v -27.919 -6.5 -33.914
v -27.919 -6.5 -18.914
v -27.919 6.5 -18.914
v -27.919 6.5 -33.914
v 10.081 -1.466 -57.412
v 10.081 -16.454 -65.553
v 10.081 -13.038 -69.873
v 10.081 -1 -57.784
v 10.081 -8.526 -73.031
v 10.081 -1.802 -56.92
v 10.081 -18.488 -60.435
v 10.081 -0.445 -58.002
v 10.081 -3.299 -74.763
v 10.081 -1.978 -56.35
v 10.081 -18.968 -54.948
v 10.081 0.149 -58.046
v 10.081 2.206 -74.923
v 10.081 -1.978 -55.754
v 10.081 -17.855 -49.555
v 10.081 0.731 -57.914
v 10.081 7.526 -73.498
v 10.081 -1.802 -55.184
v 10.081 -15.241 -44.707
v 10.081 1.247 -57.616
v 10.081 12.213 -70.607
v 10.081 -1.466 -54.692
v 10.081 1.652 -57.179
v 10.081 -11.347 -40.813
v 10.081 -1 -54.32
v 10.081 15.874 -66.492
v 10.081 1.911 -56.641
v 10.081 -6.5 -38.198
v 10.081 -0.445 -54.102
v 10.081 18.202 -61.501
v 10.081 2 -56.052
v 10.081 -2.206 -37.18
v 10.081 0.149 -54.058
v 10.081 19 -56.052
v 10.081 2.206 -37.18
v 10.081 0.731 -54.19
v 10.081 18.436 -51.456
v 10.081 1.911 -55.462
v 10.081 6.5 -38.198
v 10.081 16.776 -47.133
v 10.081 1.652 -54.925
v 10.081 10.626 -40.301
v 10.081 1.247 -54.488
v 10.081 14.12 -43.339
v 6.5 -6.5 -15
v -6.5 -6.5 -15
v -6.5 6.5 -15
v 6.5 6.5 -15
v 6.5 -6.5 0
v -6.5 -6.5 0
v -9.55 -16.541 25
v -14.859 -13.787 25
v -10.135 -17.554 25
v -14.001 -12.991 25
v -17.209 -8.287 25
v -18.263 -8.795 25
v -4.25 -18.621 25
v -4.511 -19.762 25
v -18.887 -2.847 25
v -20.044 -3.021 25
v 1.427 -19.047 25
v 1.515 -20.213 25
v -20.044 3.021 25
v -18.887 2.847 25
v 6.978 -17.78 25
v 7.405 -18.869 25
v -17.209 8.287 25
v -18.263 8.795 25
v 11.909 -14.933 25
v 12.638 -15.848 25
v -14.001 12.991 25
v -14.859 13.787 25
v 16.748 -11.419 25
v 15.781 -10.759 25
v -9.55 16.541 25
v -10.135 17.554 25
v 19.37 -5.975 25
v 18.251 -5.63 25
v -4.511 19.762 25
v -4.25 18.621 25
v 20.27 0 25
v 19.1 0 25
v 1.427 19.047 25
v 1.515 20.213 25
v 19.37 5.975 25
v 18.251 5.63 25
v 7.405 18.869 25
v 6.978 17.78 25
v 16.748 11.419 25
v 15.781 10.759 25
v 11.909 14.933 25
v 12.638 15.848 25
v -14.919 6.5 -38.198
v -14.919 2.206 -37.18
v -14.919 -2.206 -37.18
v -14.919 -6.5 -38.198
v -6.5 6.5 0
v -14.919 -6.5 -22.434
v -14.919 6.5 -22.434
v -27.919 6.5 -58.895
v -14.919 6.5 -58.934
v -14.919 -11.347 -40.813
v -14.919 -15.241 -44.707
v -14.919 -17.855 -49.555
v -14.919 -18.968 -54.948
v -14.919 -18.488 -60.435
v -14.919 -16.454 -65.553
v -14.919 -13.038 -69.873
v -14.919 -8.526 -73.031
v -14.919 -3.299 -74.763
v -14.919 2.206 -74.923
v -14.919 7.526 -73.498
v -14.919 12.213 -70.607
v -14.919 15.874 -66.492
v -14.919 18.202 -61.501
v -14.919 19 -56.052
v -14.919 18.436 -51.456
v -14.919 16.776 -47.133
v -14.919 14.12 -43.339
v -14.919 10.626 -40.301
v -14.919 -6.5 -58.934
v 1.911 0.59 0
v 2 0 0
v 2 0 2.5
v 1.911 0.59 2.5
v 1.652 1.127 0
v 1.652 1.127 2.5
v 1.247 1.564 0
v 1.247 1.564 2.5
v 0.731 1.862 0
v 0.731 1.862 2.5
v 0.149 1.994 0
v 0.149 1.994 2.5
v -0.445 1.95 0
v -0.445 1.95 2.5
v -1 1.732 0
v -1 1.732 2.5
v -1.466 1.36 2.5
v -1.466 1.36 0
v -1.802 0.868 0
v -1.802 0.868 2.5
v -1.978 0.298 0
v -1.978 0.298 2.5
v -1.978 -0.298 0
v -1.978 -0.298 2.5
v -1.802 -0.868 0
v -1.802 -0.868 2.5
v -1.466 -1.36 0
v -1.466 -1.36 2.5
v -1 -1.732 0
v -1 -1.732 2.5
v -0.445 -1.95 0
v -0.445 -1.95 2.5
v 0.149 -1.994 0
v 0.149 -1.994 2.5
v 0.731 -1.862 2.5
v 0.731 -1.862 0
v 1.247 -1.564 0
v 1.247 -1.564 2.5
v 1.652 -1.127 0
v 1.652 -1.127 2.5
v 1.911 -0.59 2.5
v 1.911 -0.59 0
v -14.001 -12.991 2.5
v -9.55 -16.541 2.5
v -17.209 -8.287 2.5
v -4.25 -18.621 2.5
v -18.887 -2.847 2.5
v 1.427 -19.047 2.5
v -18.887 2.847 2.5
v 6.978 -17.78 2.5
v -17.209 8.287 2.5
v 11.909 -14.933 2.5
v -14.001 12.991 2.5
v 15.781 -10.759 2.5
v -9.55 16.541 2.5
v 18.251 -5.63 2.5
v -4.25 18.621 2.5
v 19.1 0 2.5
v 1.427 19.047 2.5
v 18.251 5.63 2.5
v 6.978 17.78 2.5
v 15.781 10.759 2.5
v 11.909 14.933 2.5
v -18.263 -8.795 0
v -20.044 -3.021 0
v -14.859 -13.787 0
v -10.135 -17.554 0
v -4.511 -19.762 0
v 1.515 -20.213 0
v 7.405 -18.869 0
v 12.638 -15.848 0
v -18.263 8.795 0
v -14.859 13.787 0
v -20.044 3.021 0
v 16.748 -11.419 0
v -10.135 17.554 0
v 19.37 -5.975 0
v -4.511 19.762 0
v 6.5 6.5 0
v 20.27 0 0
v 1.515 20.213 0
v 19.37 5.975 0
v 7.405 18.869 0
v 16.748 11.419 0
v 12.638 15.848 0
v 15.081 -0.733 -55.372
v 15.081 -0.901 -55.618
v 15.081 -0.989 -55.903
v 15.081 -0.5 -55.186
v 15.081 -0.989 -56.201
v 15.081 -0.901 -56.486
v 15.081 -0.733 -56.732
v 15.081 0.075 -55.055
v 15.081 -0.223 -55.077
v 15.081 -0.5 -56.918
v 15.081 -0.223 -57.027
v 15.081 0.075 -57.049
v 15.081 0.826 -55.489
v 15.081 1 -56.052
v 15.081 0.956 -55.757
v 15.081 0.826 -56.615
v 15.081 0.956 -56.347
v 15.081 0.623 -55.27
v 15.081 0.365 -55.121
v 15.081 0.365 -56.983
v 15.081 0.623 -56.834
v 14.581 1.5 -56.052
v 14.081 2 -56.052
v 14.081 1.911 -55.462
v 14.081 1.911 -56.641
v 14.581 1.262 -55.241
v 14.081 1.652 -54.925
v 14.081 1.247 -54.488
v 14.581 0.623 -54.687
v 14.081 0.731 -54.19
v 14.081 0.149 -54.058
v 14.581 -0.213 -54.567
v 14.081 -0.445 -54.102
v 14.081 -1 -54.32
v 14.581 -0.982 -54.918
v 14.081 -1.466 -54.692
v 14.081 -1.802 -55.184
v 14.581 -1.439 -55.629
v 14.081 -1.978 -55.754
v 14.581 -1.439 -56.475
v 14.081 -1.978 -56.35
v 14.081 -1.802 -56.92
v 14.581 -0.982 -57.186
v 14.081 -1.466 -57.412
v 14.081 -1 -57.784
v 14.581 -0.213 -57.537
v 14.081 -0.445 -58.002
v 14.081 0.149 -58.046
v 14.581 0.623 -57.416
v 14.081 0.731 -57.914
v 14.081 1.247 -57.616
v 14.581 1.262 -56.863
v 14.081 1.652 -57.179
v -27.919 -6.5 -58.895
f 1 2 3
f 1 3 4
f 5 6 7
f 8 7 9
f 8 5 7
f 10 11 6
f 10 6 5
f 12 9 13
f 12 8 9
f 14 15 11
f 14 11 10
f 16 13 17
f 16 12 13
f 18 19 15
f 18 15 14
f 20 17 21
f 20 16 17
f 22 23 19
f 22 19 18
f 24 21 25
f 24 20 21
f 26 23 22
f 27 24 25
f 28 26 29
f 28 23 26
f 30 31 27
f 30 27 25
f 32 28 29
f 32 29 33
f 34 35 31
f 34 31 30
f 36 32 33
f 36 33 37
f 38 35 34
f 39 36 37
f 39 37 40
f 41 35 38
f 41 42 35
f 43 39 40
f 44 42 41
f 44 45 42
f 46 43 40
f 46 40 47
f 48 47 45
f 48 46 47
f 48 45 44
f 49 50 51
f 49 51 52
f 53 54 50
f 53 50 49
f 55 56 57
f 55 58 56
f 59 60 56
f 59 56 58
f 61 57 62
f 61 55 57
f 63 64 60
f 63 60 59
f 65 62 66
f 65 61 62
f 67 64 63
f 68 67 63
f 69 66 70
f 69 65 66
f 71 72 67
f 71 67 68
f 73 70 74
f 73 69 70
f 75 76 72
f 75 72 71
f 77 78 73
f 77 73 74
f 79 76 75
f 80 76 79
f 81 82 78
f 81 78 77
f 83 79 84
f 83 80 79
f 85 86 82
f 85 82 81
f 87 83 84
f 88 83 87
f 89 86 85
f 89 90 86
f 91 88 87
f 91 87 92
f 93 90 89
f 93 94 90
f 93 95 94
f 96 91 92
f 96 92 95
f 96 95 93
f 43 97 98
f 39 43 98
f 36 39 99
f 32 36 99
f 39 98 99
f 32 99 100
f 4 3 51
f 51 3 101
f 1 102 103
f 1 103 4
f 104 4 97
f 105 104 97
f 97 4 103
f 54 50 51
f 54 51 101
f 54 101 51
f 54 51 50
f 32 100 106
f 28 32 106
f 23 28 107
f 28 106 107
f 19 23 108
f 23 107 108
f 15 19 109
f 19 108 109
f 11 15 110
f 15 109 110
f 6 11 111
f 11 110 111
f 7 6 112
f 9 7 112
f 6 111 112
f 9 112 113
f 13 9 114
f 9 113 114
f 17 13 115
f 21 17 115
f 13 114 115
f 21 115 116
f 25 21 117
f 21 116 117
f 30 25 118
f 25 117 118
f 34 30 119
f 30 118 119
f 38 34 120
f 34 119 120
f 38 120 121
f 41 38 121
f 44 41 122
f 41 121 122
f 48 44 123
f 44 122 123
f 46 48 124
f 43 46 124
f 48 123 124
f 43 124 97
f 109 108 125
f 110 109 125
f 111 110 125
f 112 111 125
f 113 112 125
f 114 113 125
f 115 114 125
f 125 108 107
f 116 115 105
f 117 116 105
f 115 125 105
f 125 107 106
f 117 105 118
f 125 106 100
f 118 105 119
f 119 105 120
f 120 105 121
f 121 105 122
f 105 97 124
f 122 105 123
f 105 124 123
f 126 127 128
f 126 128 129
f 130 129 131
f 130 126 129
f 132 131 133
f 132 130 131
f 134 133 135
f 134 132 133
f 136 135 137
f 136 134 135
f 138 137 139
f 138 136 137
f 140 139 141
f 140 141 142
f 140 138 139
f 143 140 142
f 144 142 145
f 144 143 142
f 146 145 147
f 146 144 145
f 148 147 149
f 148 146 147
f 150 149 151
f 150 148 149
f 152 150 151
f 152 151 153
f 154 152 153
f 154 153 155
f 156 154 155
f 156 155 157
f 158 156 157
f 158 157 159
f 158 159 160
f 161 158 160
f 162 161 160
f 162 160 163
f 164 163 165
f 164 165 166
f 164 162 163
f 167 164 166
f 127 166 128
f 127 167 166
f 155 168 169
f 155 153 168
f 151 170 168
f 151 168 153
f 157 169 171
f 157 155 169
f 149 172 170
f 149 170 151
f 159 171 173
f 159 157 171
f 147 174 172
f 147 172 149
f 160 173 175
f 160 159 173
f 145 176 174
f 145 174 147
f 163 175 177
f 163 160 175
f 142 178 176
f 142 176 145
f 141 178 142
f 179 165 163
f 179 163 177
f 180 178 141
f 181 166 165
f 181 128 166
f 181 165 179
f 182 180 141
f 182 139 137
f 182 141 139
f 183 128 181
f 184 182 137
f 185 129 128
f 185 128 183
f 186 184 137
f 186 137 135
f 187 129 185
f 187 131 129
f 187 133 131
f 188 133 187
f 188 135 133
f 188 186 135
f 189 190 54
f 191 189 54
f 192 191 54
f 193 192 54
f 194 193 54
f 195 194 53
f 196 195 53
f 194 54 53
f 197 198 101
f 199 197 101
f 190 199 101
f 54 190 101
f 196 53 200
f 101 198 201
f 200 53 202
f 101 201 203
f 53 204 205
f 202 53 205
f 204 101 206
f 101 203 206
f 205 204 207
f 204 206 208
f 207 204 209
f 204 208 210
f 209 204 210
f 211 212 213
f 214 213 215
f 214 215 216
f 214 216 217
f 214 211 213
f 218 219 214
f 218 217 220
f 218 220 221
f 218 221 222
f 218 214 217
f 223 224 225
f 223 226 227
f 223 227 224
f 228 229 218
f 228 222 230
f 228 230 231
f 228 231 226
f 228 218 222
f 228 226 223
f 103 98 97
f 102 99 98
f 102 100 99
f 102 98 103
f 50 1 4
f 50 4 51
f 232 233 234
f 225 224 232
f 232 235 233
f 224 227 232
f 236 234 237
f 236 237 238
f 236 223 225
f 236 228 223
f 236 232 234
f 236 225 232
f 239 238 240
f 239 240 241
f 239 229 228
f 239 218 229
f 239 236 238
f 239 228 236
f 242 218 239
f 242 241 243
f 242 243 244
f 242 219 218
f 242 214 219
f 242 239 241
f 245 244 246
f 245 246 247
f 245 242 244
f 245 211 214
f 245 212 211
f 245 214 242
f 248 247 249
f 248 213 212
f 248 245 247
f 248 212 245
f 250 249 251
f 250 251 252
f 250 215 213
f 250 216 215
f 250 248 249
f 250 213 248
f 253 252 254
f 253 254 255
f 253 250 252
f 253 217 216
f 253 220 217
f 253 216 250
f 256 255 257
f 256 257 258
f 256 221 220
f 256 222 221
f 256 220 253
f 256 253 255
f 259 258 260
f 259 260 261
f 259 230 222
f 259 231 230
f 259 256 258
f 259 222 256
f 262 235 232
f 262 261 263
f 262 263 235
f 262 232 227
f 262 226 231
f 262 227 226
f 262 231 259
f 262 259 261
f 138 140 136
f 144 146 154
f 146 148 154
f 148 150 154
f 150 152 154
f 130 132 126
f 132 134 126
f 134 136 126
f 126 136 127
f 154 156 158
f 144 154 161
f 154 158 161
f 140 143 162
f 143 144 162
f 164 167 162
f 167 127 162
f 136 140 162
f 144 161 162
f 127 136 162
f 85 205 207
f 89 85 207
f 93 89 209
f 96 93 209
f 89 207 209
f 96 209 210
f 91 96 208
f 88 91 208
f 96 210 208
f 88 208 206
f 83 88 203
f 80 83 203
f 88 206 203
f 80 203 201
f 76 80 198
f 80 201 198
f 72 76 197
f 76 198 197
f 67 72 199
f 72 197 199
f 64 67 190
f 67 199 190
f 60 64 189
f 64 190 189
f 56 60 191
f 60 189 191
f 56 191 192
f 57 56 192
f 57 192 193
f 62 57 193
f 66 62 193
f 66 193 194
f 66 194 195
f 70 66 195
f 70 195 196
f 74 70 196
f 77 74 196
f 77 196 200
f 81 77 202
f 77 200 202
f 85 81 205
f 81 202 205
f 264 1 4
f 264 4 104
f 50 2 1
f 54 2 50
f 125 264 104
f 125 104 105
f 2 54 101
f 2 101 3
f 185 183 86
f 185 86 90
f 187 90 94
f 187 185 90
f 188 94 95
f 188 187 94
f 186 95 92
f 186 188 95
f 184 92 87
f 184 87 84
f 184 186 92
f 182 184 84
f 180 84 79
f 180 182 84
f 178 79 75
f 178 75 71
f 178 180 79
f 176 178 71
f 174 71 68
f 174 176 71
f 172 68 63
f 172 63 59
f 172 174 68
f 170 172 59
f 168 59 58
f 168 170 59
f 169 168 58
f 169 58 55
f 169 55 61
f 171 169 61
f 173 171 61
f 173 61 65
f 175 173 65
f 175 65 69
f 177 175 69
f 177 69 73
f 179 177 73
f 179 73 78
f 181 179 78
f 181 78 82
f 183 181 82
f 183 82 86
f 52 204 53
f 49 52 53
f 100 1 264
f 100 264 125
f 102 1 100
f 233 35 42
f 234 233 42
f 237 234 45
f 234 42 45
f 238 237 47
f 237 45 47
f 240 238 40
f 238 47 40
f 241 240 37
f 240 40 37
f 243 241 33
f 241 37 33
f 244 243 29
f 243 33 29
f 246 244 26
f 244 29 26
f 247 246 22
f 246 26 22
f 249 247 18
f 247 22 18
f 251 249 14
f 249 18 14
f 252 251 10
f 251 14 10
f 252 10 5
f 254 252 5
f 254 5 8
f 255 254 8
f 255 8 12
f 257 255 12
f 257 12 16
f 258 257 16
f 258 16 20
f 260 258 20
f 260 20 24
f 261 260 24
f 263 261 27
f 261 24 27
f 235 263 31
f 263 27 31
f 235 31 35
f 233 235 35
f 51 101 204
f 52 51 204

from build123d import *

# Parameters (mm, degrees)
F0_R      = 19.1
F0_R_2    = 2
F1_DEPTH  = 2.5
F0_R_3    = 20.2700767199
F2_DEPTH  = 25
F3_W      = 13
F3_H      = 13
F3_R      = 2
F4_DEPTH  = 15
F6_DEPTH  = 13
F8_DEPTH  = 13
F10_DEPTH = 25
F11_R     = 2
F12_DEPTH = 5
F13_SIZE  = 1


with BuildPart() as f1:
    # F0 (on Top) → F1 (new body)
    with BuildSketch(Plane.XY):
        Circle(F0_R)
        Circle(F0_R_2, mode=Mode.SUBTRACT)
    extrude(amount=F1_DEPTH)

    # F0 (on Top) → F2 (join)
    with BuildSketch(Plane.XY):
        Circle(F0_R_3)
        Circle(F0_R, mode=Mode.SUBTRACT)
    extrude(amount=F2_DEPTH)

    # F3 (on face) → F4 (join)
    with BuildSketch(Plane(origin=(0, 0, 0), x_dir=(1, 0, 0), z_dir=(0, 0, -1))):
        Rectangle(F3_W, F3_H)
        Circle(F3_R, mode=Mode.SUBTRACT)
        Circle(F3_R)
    extrude(amount=F4_DEPTH)


with BuildPart() as f6:
    # F5 (on face) → F6 (new body)
    with BuildSketch(Plane.XZ.offset(6.5)):
        Polygon((-27.918882668, -33.9136943221), (-6.5, -15), (-6.5, 0), (-27.918882668, -18.9136943221), align=None)
    extrude(amount=-F6_DEPTH)


with BuildPart() as f8:
    # F7 (on face) → F8 (new body)
    with BuildSketch(Plane.XZ.offset(6.5)):
        Polygon((-14.9189417037, -22.434248199), (-27.918882668, -33.9136943221), (-27.918882668, -58.8950701058), (-14.9189417037, -58.934248199), align=None)
    extrude(amount=-F8_DEPTH)

    # F9 (on face) → F10 (join)
    with BuildSketch(Plane.YZ.offset(-14.9189417037)):
        with BuildLine():
            ThreePointArc((-6.5, -38.1983633317), (-10.8972473589, -71.6163168193), (19, -56.0519344031))
            ThreePointArc((19, -56.0519344031), (15.5643824163, -45.1546870442), (6.5, -38.1983633317))
            Line((6.5, -38.1983633317), (6.5, -58.934248199))
            Line((6.5, -58.934248199), (-6.5, -58.934248199))
            Line((-6.5, -58.934248199), (-6.5, -38.1983633317))
        make_face()
        with BuildLine():
            Line((6.5, -58.934248199), (6.5, -38.1983633317))
            ThreePointArc((6.5, -38.1983633317), (0, -37.0519344031), (-6.5, -38.1983633317))
            Line((-6.5, -38.1983633317), (-6.5, -58.934248199))
            Line((-6.5, -58.934248199), (6.5, -58.934248199))
        make_face()
    extrude(amount=F10_DEPTH)

    # F11 (on face) → F12 (join)
    with BuildSketch(Plane.YZ.offset(10.0810582963)):
        with Locations((0, -56.0519344031)):
            Circle(F11_R)
    extrude(amount=F12_DEPTH)

    # F13
    f13_edges = [f8.edges().sort_by_distance(p)[0] for p in [
        (15.081058, -2, -56.051934),
    ]]
    chamfer(f13_edges, length=F13_SIZE)


solid = Compound([f1.part, f6.part, f8.part])
